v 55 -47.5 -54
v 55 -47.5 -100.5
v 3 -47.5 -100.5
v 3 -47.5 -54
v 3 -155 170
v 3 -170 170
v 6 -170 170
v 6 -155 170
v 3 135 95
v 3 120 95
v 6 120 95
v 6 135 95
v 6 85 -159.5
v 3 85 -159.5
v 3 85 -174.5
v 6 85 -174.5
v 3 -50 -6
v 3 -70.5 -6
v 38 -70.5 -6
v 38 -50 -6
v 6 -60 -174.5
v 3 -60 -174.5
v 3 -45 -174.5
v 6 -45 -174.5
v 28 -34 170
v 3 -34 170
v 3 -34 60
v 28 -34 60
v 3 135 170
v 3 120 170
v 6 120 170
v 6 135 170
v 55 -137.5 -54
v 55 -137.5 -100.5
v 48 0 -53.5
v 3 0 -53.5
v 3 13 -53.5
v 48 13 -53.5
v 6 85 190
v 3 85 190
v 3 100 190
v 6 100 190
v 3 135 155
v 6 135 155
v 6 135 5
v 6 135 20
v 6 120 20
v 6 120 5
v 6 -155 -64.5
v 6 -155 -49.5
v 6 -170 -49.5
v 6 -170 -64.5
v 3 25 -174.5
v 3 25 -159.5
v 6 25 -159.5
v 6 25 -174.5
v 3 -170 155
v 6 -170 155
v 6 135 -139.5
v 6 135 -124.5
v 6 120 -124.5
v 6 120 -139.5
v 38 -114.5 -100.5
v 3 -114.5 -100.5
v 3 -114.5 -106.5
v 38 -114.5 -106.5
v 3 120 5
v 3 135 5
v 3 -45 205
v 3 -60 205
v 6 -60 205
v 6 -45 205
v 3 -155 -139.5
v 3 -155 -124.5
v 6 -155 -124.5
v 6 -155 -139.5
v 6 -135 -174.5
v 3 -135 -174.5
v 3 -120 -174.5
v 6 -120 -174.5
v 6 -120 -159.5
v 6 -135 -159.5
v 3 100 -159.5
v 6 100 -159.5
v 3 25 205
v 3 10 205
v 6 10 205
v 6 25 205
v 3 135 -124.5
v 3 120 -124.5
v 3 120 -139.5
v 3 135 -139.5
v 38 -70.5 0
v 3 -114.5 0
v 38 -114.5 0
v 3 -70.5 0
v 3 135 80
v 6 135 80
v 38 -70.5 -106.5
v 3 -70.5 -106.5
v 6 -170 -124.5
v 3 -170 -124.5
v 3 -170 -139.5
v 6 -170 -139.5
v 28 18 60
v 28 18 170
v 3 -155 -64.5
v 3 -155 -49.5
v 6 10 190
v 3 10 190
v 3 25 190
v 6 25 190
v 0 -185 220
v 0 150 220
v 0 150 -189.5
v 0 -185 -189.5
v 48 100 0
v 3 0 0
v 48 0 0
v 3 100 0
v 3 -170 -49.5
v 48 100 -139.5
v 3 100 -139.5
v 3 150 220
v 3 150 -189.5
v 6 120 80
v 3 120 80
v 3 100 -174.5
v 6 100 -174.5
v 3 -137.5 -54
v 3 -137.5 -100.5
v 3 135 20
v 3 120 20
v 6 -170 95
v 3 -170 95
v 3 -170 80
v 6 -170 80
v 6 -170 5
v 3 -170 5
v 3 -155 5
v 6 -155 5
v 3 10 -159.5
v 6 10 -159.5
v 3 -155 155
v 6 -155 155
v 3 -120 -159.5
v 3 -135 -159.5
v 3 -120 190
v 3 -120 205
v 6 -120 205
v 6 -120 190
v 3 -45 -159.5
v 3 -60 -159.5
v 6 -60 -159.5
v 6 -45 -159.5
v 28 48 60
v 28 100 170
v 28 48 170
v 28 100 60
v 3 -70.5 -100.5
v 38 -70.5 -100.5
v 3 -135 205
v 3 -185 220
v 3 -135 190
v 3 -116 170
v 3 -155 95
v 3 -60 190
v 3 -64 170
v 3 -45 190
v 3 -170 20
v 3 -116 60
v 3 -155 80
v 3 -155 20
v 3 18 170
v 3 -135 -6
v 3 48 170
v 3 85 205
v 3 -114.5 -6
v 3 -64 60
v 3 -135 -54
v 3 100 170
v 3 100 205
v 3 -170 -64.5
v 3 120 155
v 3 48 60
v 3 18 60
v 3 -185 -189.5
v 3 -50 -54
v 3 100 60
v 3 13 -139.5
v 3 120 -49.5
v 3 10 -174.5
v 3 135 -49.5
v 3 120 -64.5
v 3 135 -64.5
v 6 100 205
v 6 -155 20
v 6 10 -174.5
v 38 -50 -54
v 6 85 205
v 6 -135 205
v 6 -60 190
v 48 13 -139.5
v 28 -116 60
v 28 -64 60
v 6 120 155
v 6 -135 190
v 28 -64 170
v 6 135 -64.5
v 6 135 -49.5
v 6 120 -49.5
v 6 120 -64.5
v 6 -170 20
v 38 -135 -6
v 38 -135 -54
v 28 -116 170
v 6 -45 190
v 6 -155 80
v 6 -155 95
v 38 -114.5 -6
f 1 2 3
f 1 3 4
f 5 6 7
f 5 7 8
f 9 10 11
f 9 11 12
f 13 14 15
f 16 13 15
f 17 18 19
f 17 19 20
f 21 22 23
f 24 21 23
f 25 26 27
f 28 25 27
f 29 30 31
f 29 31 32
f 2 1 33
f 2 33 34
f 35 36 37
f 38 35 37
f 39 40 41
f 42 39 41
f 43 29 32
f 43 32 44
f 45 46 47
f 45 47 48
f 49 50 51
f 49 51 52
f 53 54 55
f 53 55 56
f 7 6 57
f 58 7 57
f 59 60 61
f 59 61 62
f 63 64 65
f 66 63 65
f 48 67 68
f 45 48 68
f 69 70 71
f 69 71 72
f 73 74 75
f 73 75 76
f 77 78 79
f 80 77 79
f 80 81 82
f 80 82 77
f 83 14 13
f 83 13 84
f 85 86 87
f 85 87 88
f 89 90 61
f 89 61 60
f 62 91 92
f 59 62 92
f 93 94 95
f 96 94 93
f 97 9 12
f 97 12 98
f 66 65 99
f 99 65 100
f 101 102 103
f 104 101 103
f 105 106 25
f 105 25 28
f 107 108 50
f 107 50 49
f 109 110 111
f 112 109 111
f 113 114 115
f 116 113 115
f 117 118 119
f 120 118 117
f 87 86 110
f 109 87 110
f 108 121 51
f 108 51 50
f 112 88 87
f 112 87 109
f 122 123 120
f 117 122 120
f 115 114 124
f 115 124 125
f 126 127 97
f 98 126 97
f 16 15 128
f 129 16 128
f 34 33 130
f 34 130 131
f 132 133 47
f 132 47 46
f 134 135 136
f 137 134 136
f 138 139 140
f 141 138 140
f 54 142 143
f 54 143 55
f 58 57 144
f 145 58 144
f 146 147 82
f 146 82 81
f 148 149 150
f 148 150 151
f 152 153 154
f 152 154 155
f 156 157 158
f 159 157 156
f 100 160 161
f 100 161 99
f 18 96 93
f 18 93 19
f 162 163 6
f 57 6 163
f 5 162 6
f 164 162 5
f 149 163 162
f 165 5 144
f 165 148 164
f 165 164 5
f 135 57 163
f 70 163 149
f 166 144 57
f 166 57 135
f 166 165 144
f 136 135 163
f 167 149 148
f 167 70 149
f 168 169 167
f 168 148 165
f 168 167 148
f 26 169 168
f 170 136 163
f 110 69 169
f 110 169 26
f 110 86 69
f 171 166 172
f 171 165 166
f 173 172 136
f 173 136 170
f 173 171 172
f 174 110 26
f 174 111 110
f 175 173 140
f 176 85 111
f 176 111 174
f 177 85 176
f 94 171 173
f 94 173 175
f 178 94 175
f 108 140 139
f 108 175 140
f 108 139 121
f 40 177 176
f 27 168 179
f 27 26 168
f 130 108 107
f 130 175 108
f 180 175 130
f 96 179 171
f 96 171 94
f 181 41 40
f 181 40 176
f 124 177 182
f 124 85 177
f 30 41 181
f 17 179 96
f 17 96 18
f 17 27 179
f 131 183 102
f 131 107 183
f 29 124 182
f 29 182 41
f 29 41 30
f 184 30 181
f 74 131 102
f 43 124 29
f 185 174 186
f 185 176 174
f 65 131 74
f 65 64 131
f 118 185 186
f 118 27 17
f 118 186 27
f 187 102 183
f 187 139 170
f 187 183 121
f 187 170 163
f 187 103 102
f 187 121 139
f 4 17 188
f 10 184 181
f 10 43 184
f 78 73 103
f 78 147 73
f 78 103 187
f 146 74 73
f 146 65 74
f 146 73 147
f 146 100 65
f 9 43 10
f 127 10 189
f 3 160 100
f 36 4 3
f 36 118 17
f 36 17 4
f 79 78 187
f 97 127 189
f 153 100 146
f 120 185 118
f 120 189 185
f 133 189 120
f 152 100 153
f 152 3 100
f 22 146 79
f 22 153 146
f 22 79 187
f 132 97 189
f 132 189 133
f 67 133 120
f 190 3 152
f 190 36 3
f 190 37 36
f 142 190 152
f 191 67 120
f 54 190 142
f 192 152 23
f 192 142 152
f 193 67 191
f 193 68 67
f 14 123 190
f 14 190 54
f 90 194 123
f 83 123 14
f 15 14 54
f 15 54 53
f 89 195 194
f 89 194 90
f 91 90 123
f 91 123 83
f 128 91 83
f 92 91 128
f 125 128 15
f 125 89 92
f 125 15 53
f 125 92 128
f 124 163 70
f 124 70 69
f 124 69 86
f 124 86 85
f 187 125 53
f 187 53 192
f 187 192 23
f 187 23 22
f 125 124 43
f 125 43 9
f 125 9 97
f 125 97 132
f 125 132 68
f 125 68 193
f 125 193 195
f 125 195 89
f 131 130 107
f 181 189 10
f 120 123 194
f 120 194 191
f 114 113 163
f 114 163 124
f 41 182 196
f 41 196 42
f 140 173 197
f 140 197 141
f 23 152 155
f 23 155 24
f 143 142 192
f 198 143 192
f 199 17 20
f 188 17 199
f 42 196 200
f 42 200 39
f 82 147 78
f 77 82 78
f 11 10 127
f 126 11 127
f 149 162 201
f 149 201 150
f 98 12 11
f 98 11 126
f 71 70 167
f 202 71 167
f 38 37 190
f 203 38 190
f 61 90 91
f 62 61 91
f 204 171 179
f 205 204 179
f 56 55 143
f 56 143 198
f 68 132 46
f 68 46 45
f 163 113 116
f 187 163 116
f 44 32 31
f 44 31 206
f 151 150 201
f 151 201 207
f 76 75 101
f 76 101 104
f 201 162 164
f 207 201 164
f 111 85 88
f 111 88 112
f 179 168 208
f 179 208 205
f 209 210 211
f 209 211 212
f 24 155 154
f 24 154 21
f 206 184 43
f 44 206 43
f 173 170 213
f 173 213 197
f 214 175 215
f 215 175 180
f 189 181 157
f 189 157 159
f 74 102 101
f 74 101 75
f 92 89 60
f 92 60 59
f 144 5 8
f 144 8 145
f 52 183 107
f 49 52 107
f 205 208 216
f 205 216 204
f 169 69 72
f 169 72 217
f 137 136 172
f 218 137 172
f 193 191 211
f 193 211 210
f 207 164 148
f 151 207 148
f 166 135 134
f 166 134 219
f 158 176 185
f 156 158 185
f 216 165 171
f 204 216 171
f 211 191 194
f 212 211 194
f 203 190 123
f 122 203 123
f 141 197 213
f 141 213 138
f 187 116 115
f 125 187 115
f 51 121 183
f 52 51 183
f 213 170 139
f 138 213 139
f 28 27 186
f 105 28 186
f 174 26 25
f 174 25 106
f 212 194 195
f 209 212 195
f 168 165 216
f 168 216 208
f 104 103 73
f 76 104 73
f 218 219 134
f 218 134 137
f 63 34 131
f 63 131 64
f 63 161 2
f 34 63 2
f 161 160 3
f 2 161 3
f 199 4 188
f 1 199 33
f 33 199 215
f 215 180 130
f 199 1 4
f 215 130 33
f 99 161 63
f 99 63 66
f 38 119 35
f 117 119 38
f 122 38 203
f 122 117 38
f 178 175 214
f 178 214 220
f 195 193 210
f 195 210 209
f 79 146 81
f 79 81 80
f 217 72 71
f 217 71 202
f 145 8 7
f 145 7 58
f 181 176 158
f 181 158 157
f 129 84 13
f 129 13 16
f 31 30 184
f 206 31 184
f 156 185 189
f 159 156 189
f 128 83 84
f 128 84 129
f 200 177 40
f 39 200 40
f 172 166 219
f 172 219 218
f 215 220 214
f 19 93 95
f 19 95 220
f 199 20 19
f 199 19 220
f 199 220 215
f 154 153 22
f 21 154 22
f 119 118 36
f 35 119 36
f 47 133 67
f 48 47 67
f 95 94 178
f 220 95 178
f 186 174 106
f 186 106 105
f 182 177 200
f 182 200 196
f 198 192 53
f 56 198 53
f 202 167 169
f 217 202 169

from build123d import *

# Parameters (mm, degrees)
SKETCH1_W           = 409.5
SKETCH1_H           = 335
BOSS_EXTRUDE1_DEPTH = 3
SKETCH1_3_W         = 110
SKETCH1_3_H         = 52
BOSS_EXTRUDE2_DEPTH = 28
BOSS_EXTRUDE3_DEPTH = 48
BOSS_EXTRUDE4_DEPTH = 38
BOSS_EXTRUDE5_DEPTH = 55
SKETCH1_9_W         = 6
SKETCH1_9_H         = 44
BOSS_EXTRUDE6_DEPTH = 38
SKETCH1_10_W        = 15
SKETCH1_10_H        = 15
BOSS_EXTRUDE7_DEPTH = 6


with BuildPart() as part:
    # Sketch1 → Boss-Extrude1 (new body)
    with BuildSketch(Plane(origin=(0, 0, 0), x_dir=(0, 0, -1), z_dir=(1, 0, 0))):
        with Locations((-15.25, -17.5)):
            Rectangle(SKETCH1_W, SKETCH1_H)
    extrude(amount=BOSS_EXTRUDE1_DEPTH)

    # Sketch1<3> → Boss-Extrude2 (add)
    with BuildSketch(Plane(origin=(0, 0, 0), x_dir=(0, 0, -1), z_dir=(1, 0, 0))):
        with Locations((-115, 74)):
            Rectangle(SKETCH1_3_W, SKETCH1_3_H)
        with Locations((-115, -8)):
            Rectangle(SKETCH1_3_W, SKETCH1_3_H)
        with Locations((-115, -90)):
            Rectangle(SKETCH1_3_W, SKETCH1_3_H)
    extrude(amount=BOSS_EXTRUDE2_DEPTH)

    # Sketch1<6> → Boss-Extrude3 (add)
    with BuildSketch(Plane(origin=(0, 0, 0), x_dir=(0, 0, -1), z_dir=(1, 0, 0))):
        Polygon((139.5, 100), (0, 100), (0, 0), (53.5, 0), (53.5, 13), (139.5, 13), align=None)
    extrude(amount=BOSS_EXTRUDE3_DEPTH)

    # Sketch1<7> → Boss-Extrude4 (add)
    with BuildSketch(Plane(origin=(0, 0, 0), x_dir=(0, 0, -1), z_dir=(1, 0, 0))):
        Polygon((54, -50), (6, -50), (6, -70.5), (6, -114.5), (6, -135), (54, -135), align=None)
    extrude(amount=BOSS_EXTRUDE4_DEPTH)

    # Sketch1<8> → Boss-Extrude5 (add)
    with BuildSketch(Plane(origin=(0, 0, 0), x_dir=(0, 0, -1), z_dir=(1, 0, 0))):
        Polygon((54, -47.5), (54, -50), (54, -135), (54, -137.5), (100.5, -137.5), (100.5, -114.5), (100.5, -70.5), (100.5, -47.5), align=None)
    extrude(amount=BOSS_EXTRUDE5_DEPTH)

    # Sketch1<9> → Boss-Extrude6 (add)
    with BuildSketch(Plane(origin=(0, 0, 0), x_dir=(0, 0, -1), z_dir=(1, 0, 0))):
        with Locations((3, -92.5)):
            Rectangle(SKETCH1_9_W, SKETCH1_9_H)
        with Locations((103.5, -92.5)):
            Rectangle(SKETCH1_9_W, SKETCH1_9_H)
    extrude(amount=BOSS_EXTRUDE6_DEPTH)

    # Sketch1<10> → Boss-Extrude7 (add)
    with BuildSketch(Plane(origin=(0, 0, 0), x_dir=(0, 0, -1), z_dir=(1, 0, 0))):
        with Locations((-197.5, 92.5)):
            Rectangle(SKETCH1_10_W, SKETCH1_10_H)
        with Locations((-197.5, -127.5)):
            Rectangle(SKETCH1_10_W, SKETCH1_10_H)
        with Locations((-197.5, -52.5)):
            Rectangle(SKETCH1_10_W, SKETCH1_10_H)
        with Locations((-197.5, 17.5)):
            Rectangle(SKETCH1_10_W, SKETCH1_10_H)
        with Locations((-162.5, -162.5)):
            Rectangle(SKETCH1_10_W, SKETCH1_10_H)
        with Locations((-87.5, -162.5)):
            Rectangle(SKETCH1_10_W, SKETCH1_10_H)
        with Locations((-12.5, -162.5)):
            Rectangle(SKETCH1_10_W, SKETCH1_10_H)
        with Locations((132, -162.5)):
            Rectangle(SKETCH1_10_W, SKETCH1_10_H)
        with Locations((57, -162.5)):
            Rectangle(SKETCH1_10_W, SKETCH1_10_H)
        with Locations((167, 92.5)):
            Rectangle(SKETCH1_10_W, SKETCH1_10_H)
        with Locations((167, 17.5)):
            Rectangle(SKETCH1_10_W, SKETCH1_10_H)
        with Locations((167, -52.5)):
            Rectangle(SKETCH1_10_W, SKETCH1_10_H)
        with Locations((167, -127.5)):
            Rectangle(SKETCH1_10_W, SKETCH1_10_H)
        with Locations((-162.5, 127.5)):
            Rectangle(SKETCH1_10_W, SKETCH1_10_H)
        with Locations((-87.5, 127.5)):
            Rectangle(SKETCH1_10_W, SKETCH1_10_H)
        with Locations((57, 127.5)):
            Rectangle(SKETCH1_10_W, SKETCH1_10_H)
        with Locations((132, 127.5)):
            Rectangle(SKETCH1_10_W, SKETCH1_10_H)
        with Locations((-12.5, 127.5)):
            Rectangle(SKETCH1_10_W, SKETCH1_10_H)
    extrude(amount=BOSS_EXTRUDE7_DEPTH)


solid = part.part
